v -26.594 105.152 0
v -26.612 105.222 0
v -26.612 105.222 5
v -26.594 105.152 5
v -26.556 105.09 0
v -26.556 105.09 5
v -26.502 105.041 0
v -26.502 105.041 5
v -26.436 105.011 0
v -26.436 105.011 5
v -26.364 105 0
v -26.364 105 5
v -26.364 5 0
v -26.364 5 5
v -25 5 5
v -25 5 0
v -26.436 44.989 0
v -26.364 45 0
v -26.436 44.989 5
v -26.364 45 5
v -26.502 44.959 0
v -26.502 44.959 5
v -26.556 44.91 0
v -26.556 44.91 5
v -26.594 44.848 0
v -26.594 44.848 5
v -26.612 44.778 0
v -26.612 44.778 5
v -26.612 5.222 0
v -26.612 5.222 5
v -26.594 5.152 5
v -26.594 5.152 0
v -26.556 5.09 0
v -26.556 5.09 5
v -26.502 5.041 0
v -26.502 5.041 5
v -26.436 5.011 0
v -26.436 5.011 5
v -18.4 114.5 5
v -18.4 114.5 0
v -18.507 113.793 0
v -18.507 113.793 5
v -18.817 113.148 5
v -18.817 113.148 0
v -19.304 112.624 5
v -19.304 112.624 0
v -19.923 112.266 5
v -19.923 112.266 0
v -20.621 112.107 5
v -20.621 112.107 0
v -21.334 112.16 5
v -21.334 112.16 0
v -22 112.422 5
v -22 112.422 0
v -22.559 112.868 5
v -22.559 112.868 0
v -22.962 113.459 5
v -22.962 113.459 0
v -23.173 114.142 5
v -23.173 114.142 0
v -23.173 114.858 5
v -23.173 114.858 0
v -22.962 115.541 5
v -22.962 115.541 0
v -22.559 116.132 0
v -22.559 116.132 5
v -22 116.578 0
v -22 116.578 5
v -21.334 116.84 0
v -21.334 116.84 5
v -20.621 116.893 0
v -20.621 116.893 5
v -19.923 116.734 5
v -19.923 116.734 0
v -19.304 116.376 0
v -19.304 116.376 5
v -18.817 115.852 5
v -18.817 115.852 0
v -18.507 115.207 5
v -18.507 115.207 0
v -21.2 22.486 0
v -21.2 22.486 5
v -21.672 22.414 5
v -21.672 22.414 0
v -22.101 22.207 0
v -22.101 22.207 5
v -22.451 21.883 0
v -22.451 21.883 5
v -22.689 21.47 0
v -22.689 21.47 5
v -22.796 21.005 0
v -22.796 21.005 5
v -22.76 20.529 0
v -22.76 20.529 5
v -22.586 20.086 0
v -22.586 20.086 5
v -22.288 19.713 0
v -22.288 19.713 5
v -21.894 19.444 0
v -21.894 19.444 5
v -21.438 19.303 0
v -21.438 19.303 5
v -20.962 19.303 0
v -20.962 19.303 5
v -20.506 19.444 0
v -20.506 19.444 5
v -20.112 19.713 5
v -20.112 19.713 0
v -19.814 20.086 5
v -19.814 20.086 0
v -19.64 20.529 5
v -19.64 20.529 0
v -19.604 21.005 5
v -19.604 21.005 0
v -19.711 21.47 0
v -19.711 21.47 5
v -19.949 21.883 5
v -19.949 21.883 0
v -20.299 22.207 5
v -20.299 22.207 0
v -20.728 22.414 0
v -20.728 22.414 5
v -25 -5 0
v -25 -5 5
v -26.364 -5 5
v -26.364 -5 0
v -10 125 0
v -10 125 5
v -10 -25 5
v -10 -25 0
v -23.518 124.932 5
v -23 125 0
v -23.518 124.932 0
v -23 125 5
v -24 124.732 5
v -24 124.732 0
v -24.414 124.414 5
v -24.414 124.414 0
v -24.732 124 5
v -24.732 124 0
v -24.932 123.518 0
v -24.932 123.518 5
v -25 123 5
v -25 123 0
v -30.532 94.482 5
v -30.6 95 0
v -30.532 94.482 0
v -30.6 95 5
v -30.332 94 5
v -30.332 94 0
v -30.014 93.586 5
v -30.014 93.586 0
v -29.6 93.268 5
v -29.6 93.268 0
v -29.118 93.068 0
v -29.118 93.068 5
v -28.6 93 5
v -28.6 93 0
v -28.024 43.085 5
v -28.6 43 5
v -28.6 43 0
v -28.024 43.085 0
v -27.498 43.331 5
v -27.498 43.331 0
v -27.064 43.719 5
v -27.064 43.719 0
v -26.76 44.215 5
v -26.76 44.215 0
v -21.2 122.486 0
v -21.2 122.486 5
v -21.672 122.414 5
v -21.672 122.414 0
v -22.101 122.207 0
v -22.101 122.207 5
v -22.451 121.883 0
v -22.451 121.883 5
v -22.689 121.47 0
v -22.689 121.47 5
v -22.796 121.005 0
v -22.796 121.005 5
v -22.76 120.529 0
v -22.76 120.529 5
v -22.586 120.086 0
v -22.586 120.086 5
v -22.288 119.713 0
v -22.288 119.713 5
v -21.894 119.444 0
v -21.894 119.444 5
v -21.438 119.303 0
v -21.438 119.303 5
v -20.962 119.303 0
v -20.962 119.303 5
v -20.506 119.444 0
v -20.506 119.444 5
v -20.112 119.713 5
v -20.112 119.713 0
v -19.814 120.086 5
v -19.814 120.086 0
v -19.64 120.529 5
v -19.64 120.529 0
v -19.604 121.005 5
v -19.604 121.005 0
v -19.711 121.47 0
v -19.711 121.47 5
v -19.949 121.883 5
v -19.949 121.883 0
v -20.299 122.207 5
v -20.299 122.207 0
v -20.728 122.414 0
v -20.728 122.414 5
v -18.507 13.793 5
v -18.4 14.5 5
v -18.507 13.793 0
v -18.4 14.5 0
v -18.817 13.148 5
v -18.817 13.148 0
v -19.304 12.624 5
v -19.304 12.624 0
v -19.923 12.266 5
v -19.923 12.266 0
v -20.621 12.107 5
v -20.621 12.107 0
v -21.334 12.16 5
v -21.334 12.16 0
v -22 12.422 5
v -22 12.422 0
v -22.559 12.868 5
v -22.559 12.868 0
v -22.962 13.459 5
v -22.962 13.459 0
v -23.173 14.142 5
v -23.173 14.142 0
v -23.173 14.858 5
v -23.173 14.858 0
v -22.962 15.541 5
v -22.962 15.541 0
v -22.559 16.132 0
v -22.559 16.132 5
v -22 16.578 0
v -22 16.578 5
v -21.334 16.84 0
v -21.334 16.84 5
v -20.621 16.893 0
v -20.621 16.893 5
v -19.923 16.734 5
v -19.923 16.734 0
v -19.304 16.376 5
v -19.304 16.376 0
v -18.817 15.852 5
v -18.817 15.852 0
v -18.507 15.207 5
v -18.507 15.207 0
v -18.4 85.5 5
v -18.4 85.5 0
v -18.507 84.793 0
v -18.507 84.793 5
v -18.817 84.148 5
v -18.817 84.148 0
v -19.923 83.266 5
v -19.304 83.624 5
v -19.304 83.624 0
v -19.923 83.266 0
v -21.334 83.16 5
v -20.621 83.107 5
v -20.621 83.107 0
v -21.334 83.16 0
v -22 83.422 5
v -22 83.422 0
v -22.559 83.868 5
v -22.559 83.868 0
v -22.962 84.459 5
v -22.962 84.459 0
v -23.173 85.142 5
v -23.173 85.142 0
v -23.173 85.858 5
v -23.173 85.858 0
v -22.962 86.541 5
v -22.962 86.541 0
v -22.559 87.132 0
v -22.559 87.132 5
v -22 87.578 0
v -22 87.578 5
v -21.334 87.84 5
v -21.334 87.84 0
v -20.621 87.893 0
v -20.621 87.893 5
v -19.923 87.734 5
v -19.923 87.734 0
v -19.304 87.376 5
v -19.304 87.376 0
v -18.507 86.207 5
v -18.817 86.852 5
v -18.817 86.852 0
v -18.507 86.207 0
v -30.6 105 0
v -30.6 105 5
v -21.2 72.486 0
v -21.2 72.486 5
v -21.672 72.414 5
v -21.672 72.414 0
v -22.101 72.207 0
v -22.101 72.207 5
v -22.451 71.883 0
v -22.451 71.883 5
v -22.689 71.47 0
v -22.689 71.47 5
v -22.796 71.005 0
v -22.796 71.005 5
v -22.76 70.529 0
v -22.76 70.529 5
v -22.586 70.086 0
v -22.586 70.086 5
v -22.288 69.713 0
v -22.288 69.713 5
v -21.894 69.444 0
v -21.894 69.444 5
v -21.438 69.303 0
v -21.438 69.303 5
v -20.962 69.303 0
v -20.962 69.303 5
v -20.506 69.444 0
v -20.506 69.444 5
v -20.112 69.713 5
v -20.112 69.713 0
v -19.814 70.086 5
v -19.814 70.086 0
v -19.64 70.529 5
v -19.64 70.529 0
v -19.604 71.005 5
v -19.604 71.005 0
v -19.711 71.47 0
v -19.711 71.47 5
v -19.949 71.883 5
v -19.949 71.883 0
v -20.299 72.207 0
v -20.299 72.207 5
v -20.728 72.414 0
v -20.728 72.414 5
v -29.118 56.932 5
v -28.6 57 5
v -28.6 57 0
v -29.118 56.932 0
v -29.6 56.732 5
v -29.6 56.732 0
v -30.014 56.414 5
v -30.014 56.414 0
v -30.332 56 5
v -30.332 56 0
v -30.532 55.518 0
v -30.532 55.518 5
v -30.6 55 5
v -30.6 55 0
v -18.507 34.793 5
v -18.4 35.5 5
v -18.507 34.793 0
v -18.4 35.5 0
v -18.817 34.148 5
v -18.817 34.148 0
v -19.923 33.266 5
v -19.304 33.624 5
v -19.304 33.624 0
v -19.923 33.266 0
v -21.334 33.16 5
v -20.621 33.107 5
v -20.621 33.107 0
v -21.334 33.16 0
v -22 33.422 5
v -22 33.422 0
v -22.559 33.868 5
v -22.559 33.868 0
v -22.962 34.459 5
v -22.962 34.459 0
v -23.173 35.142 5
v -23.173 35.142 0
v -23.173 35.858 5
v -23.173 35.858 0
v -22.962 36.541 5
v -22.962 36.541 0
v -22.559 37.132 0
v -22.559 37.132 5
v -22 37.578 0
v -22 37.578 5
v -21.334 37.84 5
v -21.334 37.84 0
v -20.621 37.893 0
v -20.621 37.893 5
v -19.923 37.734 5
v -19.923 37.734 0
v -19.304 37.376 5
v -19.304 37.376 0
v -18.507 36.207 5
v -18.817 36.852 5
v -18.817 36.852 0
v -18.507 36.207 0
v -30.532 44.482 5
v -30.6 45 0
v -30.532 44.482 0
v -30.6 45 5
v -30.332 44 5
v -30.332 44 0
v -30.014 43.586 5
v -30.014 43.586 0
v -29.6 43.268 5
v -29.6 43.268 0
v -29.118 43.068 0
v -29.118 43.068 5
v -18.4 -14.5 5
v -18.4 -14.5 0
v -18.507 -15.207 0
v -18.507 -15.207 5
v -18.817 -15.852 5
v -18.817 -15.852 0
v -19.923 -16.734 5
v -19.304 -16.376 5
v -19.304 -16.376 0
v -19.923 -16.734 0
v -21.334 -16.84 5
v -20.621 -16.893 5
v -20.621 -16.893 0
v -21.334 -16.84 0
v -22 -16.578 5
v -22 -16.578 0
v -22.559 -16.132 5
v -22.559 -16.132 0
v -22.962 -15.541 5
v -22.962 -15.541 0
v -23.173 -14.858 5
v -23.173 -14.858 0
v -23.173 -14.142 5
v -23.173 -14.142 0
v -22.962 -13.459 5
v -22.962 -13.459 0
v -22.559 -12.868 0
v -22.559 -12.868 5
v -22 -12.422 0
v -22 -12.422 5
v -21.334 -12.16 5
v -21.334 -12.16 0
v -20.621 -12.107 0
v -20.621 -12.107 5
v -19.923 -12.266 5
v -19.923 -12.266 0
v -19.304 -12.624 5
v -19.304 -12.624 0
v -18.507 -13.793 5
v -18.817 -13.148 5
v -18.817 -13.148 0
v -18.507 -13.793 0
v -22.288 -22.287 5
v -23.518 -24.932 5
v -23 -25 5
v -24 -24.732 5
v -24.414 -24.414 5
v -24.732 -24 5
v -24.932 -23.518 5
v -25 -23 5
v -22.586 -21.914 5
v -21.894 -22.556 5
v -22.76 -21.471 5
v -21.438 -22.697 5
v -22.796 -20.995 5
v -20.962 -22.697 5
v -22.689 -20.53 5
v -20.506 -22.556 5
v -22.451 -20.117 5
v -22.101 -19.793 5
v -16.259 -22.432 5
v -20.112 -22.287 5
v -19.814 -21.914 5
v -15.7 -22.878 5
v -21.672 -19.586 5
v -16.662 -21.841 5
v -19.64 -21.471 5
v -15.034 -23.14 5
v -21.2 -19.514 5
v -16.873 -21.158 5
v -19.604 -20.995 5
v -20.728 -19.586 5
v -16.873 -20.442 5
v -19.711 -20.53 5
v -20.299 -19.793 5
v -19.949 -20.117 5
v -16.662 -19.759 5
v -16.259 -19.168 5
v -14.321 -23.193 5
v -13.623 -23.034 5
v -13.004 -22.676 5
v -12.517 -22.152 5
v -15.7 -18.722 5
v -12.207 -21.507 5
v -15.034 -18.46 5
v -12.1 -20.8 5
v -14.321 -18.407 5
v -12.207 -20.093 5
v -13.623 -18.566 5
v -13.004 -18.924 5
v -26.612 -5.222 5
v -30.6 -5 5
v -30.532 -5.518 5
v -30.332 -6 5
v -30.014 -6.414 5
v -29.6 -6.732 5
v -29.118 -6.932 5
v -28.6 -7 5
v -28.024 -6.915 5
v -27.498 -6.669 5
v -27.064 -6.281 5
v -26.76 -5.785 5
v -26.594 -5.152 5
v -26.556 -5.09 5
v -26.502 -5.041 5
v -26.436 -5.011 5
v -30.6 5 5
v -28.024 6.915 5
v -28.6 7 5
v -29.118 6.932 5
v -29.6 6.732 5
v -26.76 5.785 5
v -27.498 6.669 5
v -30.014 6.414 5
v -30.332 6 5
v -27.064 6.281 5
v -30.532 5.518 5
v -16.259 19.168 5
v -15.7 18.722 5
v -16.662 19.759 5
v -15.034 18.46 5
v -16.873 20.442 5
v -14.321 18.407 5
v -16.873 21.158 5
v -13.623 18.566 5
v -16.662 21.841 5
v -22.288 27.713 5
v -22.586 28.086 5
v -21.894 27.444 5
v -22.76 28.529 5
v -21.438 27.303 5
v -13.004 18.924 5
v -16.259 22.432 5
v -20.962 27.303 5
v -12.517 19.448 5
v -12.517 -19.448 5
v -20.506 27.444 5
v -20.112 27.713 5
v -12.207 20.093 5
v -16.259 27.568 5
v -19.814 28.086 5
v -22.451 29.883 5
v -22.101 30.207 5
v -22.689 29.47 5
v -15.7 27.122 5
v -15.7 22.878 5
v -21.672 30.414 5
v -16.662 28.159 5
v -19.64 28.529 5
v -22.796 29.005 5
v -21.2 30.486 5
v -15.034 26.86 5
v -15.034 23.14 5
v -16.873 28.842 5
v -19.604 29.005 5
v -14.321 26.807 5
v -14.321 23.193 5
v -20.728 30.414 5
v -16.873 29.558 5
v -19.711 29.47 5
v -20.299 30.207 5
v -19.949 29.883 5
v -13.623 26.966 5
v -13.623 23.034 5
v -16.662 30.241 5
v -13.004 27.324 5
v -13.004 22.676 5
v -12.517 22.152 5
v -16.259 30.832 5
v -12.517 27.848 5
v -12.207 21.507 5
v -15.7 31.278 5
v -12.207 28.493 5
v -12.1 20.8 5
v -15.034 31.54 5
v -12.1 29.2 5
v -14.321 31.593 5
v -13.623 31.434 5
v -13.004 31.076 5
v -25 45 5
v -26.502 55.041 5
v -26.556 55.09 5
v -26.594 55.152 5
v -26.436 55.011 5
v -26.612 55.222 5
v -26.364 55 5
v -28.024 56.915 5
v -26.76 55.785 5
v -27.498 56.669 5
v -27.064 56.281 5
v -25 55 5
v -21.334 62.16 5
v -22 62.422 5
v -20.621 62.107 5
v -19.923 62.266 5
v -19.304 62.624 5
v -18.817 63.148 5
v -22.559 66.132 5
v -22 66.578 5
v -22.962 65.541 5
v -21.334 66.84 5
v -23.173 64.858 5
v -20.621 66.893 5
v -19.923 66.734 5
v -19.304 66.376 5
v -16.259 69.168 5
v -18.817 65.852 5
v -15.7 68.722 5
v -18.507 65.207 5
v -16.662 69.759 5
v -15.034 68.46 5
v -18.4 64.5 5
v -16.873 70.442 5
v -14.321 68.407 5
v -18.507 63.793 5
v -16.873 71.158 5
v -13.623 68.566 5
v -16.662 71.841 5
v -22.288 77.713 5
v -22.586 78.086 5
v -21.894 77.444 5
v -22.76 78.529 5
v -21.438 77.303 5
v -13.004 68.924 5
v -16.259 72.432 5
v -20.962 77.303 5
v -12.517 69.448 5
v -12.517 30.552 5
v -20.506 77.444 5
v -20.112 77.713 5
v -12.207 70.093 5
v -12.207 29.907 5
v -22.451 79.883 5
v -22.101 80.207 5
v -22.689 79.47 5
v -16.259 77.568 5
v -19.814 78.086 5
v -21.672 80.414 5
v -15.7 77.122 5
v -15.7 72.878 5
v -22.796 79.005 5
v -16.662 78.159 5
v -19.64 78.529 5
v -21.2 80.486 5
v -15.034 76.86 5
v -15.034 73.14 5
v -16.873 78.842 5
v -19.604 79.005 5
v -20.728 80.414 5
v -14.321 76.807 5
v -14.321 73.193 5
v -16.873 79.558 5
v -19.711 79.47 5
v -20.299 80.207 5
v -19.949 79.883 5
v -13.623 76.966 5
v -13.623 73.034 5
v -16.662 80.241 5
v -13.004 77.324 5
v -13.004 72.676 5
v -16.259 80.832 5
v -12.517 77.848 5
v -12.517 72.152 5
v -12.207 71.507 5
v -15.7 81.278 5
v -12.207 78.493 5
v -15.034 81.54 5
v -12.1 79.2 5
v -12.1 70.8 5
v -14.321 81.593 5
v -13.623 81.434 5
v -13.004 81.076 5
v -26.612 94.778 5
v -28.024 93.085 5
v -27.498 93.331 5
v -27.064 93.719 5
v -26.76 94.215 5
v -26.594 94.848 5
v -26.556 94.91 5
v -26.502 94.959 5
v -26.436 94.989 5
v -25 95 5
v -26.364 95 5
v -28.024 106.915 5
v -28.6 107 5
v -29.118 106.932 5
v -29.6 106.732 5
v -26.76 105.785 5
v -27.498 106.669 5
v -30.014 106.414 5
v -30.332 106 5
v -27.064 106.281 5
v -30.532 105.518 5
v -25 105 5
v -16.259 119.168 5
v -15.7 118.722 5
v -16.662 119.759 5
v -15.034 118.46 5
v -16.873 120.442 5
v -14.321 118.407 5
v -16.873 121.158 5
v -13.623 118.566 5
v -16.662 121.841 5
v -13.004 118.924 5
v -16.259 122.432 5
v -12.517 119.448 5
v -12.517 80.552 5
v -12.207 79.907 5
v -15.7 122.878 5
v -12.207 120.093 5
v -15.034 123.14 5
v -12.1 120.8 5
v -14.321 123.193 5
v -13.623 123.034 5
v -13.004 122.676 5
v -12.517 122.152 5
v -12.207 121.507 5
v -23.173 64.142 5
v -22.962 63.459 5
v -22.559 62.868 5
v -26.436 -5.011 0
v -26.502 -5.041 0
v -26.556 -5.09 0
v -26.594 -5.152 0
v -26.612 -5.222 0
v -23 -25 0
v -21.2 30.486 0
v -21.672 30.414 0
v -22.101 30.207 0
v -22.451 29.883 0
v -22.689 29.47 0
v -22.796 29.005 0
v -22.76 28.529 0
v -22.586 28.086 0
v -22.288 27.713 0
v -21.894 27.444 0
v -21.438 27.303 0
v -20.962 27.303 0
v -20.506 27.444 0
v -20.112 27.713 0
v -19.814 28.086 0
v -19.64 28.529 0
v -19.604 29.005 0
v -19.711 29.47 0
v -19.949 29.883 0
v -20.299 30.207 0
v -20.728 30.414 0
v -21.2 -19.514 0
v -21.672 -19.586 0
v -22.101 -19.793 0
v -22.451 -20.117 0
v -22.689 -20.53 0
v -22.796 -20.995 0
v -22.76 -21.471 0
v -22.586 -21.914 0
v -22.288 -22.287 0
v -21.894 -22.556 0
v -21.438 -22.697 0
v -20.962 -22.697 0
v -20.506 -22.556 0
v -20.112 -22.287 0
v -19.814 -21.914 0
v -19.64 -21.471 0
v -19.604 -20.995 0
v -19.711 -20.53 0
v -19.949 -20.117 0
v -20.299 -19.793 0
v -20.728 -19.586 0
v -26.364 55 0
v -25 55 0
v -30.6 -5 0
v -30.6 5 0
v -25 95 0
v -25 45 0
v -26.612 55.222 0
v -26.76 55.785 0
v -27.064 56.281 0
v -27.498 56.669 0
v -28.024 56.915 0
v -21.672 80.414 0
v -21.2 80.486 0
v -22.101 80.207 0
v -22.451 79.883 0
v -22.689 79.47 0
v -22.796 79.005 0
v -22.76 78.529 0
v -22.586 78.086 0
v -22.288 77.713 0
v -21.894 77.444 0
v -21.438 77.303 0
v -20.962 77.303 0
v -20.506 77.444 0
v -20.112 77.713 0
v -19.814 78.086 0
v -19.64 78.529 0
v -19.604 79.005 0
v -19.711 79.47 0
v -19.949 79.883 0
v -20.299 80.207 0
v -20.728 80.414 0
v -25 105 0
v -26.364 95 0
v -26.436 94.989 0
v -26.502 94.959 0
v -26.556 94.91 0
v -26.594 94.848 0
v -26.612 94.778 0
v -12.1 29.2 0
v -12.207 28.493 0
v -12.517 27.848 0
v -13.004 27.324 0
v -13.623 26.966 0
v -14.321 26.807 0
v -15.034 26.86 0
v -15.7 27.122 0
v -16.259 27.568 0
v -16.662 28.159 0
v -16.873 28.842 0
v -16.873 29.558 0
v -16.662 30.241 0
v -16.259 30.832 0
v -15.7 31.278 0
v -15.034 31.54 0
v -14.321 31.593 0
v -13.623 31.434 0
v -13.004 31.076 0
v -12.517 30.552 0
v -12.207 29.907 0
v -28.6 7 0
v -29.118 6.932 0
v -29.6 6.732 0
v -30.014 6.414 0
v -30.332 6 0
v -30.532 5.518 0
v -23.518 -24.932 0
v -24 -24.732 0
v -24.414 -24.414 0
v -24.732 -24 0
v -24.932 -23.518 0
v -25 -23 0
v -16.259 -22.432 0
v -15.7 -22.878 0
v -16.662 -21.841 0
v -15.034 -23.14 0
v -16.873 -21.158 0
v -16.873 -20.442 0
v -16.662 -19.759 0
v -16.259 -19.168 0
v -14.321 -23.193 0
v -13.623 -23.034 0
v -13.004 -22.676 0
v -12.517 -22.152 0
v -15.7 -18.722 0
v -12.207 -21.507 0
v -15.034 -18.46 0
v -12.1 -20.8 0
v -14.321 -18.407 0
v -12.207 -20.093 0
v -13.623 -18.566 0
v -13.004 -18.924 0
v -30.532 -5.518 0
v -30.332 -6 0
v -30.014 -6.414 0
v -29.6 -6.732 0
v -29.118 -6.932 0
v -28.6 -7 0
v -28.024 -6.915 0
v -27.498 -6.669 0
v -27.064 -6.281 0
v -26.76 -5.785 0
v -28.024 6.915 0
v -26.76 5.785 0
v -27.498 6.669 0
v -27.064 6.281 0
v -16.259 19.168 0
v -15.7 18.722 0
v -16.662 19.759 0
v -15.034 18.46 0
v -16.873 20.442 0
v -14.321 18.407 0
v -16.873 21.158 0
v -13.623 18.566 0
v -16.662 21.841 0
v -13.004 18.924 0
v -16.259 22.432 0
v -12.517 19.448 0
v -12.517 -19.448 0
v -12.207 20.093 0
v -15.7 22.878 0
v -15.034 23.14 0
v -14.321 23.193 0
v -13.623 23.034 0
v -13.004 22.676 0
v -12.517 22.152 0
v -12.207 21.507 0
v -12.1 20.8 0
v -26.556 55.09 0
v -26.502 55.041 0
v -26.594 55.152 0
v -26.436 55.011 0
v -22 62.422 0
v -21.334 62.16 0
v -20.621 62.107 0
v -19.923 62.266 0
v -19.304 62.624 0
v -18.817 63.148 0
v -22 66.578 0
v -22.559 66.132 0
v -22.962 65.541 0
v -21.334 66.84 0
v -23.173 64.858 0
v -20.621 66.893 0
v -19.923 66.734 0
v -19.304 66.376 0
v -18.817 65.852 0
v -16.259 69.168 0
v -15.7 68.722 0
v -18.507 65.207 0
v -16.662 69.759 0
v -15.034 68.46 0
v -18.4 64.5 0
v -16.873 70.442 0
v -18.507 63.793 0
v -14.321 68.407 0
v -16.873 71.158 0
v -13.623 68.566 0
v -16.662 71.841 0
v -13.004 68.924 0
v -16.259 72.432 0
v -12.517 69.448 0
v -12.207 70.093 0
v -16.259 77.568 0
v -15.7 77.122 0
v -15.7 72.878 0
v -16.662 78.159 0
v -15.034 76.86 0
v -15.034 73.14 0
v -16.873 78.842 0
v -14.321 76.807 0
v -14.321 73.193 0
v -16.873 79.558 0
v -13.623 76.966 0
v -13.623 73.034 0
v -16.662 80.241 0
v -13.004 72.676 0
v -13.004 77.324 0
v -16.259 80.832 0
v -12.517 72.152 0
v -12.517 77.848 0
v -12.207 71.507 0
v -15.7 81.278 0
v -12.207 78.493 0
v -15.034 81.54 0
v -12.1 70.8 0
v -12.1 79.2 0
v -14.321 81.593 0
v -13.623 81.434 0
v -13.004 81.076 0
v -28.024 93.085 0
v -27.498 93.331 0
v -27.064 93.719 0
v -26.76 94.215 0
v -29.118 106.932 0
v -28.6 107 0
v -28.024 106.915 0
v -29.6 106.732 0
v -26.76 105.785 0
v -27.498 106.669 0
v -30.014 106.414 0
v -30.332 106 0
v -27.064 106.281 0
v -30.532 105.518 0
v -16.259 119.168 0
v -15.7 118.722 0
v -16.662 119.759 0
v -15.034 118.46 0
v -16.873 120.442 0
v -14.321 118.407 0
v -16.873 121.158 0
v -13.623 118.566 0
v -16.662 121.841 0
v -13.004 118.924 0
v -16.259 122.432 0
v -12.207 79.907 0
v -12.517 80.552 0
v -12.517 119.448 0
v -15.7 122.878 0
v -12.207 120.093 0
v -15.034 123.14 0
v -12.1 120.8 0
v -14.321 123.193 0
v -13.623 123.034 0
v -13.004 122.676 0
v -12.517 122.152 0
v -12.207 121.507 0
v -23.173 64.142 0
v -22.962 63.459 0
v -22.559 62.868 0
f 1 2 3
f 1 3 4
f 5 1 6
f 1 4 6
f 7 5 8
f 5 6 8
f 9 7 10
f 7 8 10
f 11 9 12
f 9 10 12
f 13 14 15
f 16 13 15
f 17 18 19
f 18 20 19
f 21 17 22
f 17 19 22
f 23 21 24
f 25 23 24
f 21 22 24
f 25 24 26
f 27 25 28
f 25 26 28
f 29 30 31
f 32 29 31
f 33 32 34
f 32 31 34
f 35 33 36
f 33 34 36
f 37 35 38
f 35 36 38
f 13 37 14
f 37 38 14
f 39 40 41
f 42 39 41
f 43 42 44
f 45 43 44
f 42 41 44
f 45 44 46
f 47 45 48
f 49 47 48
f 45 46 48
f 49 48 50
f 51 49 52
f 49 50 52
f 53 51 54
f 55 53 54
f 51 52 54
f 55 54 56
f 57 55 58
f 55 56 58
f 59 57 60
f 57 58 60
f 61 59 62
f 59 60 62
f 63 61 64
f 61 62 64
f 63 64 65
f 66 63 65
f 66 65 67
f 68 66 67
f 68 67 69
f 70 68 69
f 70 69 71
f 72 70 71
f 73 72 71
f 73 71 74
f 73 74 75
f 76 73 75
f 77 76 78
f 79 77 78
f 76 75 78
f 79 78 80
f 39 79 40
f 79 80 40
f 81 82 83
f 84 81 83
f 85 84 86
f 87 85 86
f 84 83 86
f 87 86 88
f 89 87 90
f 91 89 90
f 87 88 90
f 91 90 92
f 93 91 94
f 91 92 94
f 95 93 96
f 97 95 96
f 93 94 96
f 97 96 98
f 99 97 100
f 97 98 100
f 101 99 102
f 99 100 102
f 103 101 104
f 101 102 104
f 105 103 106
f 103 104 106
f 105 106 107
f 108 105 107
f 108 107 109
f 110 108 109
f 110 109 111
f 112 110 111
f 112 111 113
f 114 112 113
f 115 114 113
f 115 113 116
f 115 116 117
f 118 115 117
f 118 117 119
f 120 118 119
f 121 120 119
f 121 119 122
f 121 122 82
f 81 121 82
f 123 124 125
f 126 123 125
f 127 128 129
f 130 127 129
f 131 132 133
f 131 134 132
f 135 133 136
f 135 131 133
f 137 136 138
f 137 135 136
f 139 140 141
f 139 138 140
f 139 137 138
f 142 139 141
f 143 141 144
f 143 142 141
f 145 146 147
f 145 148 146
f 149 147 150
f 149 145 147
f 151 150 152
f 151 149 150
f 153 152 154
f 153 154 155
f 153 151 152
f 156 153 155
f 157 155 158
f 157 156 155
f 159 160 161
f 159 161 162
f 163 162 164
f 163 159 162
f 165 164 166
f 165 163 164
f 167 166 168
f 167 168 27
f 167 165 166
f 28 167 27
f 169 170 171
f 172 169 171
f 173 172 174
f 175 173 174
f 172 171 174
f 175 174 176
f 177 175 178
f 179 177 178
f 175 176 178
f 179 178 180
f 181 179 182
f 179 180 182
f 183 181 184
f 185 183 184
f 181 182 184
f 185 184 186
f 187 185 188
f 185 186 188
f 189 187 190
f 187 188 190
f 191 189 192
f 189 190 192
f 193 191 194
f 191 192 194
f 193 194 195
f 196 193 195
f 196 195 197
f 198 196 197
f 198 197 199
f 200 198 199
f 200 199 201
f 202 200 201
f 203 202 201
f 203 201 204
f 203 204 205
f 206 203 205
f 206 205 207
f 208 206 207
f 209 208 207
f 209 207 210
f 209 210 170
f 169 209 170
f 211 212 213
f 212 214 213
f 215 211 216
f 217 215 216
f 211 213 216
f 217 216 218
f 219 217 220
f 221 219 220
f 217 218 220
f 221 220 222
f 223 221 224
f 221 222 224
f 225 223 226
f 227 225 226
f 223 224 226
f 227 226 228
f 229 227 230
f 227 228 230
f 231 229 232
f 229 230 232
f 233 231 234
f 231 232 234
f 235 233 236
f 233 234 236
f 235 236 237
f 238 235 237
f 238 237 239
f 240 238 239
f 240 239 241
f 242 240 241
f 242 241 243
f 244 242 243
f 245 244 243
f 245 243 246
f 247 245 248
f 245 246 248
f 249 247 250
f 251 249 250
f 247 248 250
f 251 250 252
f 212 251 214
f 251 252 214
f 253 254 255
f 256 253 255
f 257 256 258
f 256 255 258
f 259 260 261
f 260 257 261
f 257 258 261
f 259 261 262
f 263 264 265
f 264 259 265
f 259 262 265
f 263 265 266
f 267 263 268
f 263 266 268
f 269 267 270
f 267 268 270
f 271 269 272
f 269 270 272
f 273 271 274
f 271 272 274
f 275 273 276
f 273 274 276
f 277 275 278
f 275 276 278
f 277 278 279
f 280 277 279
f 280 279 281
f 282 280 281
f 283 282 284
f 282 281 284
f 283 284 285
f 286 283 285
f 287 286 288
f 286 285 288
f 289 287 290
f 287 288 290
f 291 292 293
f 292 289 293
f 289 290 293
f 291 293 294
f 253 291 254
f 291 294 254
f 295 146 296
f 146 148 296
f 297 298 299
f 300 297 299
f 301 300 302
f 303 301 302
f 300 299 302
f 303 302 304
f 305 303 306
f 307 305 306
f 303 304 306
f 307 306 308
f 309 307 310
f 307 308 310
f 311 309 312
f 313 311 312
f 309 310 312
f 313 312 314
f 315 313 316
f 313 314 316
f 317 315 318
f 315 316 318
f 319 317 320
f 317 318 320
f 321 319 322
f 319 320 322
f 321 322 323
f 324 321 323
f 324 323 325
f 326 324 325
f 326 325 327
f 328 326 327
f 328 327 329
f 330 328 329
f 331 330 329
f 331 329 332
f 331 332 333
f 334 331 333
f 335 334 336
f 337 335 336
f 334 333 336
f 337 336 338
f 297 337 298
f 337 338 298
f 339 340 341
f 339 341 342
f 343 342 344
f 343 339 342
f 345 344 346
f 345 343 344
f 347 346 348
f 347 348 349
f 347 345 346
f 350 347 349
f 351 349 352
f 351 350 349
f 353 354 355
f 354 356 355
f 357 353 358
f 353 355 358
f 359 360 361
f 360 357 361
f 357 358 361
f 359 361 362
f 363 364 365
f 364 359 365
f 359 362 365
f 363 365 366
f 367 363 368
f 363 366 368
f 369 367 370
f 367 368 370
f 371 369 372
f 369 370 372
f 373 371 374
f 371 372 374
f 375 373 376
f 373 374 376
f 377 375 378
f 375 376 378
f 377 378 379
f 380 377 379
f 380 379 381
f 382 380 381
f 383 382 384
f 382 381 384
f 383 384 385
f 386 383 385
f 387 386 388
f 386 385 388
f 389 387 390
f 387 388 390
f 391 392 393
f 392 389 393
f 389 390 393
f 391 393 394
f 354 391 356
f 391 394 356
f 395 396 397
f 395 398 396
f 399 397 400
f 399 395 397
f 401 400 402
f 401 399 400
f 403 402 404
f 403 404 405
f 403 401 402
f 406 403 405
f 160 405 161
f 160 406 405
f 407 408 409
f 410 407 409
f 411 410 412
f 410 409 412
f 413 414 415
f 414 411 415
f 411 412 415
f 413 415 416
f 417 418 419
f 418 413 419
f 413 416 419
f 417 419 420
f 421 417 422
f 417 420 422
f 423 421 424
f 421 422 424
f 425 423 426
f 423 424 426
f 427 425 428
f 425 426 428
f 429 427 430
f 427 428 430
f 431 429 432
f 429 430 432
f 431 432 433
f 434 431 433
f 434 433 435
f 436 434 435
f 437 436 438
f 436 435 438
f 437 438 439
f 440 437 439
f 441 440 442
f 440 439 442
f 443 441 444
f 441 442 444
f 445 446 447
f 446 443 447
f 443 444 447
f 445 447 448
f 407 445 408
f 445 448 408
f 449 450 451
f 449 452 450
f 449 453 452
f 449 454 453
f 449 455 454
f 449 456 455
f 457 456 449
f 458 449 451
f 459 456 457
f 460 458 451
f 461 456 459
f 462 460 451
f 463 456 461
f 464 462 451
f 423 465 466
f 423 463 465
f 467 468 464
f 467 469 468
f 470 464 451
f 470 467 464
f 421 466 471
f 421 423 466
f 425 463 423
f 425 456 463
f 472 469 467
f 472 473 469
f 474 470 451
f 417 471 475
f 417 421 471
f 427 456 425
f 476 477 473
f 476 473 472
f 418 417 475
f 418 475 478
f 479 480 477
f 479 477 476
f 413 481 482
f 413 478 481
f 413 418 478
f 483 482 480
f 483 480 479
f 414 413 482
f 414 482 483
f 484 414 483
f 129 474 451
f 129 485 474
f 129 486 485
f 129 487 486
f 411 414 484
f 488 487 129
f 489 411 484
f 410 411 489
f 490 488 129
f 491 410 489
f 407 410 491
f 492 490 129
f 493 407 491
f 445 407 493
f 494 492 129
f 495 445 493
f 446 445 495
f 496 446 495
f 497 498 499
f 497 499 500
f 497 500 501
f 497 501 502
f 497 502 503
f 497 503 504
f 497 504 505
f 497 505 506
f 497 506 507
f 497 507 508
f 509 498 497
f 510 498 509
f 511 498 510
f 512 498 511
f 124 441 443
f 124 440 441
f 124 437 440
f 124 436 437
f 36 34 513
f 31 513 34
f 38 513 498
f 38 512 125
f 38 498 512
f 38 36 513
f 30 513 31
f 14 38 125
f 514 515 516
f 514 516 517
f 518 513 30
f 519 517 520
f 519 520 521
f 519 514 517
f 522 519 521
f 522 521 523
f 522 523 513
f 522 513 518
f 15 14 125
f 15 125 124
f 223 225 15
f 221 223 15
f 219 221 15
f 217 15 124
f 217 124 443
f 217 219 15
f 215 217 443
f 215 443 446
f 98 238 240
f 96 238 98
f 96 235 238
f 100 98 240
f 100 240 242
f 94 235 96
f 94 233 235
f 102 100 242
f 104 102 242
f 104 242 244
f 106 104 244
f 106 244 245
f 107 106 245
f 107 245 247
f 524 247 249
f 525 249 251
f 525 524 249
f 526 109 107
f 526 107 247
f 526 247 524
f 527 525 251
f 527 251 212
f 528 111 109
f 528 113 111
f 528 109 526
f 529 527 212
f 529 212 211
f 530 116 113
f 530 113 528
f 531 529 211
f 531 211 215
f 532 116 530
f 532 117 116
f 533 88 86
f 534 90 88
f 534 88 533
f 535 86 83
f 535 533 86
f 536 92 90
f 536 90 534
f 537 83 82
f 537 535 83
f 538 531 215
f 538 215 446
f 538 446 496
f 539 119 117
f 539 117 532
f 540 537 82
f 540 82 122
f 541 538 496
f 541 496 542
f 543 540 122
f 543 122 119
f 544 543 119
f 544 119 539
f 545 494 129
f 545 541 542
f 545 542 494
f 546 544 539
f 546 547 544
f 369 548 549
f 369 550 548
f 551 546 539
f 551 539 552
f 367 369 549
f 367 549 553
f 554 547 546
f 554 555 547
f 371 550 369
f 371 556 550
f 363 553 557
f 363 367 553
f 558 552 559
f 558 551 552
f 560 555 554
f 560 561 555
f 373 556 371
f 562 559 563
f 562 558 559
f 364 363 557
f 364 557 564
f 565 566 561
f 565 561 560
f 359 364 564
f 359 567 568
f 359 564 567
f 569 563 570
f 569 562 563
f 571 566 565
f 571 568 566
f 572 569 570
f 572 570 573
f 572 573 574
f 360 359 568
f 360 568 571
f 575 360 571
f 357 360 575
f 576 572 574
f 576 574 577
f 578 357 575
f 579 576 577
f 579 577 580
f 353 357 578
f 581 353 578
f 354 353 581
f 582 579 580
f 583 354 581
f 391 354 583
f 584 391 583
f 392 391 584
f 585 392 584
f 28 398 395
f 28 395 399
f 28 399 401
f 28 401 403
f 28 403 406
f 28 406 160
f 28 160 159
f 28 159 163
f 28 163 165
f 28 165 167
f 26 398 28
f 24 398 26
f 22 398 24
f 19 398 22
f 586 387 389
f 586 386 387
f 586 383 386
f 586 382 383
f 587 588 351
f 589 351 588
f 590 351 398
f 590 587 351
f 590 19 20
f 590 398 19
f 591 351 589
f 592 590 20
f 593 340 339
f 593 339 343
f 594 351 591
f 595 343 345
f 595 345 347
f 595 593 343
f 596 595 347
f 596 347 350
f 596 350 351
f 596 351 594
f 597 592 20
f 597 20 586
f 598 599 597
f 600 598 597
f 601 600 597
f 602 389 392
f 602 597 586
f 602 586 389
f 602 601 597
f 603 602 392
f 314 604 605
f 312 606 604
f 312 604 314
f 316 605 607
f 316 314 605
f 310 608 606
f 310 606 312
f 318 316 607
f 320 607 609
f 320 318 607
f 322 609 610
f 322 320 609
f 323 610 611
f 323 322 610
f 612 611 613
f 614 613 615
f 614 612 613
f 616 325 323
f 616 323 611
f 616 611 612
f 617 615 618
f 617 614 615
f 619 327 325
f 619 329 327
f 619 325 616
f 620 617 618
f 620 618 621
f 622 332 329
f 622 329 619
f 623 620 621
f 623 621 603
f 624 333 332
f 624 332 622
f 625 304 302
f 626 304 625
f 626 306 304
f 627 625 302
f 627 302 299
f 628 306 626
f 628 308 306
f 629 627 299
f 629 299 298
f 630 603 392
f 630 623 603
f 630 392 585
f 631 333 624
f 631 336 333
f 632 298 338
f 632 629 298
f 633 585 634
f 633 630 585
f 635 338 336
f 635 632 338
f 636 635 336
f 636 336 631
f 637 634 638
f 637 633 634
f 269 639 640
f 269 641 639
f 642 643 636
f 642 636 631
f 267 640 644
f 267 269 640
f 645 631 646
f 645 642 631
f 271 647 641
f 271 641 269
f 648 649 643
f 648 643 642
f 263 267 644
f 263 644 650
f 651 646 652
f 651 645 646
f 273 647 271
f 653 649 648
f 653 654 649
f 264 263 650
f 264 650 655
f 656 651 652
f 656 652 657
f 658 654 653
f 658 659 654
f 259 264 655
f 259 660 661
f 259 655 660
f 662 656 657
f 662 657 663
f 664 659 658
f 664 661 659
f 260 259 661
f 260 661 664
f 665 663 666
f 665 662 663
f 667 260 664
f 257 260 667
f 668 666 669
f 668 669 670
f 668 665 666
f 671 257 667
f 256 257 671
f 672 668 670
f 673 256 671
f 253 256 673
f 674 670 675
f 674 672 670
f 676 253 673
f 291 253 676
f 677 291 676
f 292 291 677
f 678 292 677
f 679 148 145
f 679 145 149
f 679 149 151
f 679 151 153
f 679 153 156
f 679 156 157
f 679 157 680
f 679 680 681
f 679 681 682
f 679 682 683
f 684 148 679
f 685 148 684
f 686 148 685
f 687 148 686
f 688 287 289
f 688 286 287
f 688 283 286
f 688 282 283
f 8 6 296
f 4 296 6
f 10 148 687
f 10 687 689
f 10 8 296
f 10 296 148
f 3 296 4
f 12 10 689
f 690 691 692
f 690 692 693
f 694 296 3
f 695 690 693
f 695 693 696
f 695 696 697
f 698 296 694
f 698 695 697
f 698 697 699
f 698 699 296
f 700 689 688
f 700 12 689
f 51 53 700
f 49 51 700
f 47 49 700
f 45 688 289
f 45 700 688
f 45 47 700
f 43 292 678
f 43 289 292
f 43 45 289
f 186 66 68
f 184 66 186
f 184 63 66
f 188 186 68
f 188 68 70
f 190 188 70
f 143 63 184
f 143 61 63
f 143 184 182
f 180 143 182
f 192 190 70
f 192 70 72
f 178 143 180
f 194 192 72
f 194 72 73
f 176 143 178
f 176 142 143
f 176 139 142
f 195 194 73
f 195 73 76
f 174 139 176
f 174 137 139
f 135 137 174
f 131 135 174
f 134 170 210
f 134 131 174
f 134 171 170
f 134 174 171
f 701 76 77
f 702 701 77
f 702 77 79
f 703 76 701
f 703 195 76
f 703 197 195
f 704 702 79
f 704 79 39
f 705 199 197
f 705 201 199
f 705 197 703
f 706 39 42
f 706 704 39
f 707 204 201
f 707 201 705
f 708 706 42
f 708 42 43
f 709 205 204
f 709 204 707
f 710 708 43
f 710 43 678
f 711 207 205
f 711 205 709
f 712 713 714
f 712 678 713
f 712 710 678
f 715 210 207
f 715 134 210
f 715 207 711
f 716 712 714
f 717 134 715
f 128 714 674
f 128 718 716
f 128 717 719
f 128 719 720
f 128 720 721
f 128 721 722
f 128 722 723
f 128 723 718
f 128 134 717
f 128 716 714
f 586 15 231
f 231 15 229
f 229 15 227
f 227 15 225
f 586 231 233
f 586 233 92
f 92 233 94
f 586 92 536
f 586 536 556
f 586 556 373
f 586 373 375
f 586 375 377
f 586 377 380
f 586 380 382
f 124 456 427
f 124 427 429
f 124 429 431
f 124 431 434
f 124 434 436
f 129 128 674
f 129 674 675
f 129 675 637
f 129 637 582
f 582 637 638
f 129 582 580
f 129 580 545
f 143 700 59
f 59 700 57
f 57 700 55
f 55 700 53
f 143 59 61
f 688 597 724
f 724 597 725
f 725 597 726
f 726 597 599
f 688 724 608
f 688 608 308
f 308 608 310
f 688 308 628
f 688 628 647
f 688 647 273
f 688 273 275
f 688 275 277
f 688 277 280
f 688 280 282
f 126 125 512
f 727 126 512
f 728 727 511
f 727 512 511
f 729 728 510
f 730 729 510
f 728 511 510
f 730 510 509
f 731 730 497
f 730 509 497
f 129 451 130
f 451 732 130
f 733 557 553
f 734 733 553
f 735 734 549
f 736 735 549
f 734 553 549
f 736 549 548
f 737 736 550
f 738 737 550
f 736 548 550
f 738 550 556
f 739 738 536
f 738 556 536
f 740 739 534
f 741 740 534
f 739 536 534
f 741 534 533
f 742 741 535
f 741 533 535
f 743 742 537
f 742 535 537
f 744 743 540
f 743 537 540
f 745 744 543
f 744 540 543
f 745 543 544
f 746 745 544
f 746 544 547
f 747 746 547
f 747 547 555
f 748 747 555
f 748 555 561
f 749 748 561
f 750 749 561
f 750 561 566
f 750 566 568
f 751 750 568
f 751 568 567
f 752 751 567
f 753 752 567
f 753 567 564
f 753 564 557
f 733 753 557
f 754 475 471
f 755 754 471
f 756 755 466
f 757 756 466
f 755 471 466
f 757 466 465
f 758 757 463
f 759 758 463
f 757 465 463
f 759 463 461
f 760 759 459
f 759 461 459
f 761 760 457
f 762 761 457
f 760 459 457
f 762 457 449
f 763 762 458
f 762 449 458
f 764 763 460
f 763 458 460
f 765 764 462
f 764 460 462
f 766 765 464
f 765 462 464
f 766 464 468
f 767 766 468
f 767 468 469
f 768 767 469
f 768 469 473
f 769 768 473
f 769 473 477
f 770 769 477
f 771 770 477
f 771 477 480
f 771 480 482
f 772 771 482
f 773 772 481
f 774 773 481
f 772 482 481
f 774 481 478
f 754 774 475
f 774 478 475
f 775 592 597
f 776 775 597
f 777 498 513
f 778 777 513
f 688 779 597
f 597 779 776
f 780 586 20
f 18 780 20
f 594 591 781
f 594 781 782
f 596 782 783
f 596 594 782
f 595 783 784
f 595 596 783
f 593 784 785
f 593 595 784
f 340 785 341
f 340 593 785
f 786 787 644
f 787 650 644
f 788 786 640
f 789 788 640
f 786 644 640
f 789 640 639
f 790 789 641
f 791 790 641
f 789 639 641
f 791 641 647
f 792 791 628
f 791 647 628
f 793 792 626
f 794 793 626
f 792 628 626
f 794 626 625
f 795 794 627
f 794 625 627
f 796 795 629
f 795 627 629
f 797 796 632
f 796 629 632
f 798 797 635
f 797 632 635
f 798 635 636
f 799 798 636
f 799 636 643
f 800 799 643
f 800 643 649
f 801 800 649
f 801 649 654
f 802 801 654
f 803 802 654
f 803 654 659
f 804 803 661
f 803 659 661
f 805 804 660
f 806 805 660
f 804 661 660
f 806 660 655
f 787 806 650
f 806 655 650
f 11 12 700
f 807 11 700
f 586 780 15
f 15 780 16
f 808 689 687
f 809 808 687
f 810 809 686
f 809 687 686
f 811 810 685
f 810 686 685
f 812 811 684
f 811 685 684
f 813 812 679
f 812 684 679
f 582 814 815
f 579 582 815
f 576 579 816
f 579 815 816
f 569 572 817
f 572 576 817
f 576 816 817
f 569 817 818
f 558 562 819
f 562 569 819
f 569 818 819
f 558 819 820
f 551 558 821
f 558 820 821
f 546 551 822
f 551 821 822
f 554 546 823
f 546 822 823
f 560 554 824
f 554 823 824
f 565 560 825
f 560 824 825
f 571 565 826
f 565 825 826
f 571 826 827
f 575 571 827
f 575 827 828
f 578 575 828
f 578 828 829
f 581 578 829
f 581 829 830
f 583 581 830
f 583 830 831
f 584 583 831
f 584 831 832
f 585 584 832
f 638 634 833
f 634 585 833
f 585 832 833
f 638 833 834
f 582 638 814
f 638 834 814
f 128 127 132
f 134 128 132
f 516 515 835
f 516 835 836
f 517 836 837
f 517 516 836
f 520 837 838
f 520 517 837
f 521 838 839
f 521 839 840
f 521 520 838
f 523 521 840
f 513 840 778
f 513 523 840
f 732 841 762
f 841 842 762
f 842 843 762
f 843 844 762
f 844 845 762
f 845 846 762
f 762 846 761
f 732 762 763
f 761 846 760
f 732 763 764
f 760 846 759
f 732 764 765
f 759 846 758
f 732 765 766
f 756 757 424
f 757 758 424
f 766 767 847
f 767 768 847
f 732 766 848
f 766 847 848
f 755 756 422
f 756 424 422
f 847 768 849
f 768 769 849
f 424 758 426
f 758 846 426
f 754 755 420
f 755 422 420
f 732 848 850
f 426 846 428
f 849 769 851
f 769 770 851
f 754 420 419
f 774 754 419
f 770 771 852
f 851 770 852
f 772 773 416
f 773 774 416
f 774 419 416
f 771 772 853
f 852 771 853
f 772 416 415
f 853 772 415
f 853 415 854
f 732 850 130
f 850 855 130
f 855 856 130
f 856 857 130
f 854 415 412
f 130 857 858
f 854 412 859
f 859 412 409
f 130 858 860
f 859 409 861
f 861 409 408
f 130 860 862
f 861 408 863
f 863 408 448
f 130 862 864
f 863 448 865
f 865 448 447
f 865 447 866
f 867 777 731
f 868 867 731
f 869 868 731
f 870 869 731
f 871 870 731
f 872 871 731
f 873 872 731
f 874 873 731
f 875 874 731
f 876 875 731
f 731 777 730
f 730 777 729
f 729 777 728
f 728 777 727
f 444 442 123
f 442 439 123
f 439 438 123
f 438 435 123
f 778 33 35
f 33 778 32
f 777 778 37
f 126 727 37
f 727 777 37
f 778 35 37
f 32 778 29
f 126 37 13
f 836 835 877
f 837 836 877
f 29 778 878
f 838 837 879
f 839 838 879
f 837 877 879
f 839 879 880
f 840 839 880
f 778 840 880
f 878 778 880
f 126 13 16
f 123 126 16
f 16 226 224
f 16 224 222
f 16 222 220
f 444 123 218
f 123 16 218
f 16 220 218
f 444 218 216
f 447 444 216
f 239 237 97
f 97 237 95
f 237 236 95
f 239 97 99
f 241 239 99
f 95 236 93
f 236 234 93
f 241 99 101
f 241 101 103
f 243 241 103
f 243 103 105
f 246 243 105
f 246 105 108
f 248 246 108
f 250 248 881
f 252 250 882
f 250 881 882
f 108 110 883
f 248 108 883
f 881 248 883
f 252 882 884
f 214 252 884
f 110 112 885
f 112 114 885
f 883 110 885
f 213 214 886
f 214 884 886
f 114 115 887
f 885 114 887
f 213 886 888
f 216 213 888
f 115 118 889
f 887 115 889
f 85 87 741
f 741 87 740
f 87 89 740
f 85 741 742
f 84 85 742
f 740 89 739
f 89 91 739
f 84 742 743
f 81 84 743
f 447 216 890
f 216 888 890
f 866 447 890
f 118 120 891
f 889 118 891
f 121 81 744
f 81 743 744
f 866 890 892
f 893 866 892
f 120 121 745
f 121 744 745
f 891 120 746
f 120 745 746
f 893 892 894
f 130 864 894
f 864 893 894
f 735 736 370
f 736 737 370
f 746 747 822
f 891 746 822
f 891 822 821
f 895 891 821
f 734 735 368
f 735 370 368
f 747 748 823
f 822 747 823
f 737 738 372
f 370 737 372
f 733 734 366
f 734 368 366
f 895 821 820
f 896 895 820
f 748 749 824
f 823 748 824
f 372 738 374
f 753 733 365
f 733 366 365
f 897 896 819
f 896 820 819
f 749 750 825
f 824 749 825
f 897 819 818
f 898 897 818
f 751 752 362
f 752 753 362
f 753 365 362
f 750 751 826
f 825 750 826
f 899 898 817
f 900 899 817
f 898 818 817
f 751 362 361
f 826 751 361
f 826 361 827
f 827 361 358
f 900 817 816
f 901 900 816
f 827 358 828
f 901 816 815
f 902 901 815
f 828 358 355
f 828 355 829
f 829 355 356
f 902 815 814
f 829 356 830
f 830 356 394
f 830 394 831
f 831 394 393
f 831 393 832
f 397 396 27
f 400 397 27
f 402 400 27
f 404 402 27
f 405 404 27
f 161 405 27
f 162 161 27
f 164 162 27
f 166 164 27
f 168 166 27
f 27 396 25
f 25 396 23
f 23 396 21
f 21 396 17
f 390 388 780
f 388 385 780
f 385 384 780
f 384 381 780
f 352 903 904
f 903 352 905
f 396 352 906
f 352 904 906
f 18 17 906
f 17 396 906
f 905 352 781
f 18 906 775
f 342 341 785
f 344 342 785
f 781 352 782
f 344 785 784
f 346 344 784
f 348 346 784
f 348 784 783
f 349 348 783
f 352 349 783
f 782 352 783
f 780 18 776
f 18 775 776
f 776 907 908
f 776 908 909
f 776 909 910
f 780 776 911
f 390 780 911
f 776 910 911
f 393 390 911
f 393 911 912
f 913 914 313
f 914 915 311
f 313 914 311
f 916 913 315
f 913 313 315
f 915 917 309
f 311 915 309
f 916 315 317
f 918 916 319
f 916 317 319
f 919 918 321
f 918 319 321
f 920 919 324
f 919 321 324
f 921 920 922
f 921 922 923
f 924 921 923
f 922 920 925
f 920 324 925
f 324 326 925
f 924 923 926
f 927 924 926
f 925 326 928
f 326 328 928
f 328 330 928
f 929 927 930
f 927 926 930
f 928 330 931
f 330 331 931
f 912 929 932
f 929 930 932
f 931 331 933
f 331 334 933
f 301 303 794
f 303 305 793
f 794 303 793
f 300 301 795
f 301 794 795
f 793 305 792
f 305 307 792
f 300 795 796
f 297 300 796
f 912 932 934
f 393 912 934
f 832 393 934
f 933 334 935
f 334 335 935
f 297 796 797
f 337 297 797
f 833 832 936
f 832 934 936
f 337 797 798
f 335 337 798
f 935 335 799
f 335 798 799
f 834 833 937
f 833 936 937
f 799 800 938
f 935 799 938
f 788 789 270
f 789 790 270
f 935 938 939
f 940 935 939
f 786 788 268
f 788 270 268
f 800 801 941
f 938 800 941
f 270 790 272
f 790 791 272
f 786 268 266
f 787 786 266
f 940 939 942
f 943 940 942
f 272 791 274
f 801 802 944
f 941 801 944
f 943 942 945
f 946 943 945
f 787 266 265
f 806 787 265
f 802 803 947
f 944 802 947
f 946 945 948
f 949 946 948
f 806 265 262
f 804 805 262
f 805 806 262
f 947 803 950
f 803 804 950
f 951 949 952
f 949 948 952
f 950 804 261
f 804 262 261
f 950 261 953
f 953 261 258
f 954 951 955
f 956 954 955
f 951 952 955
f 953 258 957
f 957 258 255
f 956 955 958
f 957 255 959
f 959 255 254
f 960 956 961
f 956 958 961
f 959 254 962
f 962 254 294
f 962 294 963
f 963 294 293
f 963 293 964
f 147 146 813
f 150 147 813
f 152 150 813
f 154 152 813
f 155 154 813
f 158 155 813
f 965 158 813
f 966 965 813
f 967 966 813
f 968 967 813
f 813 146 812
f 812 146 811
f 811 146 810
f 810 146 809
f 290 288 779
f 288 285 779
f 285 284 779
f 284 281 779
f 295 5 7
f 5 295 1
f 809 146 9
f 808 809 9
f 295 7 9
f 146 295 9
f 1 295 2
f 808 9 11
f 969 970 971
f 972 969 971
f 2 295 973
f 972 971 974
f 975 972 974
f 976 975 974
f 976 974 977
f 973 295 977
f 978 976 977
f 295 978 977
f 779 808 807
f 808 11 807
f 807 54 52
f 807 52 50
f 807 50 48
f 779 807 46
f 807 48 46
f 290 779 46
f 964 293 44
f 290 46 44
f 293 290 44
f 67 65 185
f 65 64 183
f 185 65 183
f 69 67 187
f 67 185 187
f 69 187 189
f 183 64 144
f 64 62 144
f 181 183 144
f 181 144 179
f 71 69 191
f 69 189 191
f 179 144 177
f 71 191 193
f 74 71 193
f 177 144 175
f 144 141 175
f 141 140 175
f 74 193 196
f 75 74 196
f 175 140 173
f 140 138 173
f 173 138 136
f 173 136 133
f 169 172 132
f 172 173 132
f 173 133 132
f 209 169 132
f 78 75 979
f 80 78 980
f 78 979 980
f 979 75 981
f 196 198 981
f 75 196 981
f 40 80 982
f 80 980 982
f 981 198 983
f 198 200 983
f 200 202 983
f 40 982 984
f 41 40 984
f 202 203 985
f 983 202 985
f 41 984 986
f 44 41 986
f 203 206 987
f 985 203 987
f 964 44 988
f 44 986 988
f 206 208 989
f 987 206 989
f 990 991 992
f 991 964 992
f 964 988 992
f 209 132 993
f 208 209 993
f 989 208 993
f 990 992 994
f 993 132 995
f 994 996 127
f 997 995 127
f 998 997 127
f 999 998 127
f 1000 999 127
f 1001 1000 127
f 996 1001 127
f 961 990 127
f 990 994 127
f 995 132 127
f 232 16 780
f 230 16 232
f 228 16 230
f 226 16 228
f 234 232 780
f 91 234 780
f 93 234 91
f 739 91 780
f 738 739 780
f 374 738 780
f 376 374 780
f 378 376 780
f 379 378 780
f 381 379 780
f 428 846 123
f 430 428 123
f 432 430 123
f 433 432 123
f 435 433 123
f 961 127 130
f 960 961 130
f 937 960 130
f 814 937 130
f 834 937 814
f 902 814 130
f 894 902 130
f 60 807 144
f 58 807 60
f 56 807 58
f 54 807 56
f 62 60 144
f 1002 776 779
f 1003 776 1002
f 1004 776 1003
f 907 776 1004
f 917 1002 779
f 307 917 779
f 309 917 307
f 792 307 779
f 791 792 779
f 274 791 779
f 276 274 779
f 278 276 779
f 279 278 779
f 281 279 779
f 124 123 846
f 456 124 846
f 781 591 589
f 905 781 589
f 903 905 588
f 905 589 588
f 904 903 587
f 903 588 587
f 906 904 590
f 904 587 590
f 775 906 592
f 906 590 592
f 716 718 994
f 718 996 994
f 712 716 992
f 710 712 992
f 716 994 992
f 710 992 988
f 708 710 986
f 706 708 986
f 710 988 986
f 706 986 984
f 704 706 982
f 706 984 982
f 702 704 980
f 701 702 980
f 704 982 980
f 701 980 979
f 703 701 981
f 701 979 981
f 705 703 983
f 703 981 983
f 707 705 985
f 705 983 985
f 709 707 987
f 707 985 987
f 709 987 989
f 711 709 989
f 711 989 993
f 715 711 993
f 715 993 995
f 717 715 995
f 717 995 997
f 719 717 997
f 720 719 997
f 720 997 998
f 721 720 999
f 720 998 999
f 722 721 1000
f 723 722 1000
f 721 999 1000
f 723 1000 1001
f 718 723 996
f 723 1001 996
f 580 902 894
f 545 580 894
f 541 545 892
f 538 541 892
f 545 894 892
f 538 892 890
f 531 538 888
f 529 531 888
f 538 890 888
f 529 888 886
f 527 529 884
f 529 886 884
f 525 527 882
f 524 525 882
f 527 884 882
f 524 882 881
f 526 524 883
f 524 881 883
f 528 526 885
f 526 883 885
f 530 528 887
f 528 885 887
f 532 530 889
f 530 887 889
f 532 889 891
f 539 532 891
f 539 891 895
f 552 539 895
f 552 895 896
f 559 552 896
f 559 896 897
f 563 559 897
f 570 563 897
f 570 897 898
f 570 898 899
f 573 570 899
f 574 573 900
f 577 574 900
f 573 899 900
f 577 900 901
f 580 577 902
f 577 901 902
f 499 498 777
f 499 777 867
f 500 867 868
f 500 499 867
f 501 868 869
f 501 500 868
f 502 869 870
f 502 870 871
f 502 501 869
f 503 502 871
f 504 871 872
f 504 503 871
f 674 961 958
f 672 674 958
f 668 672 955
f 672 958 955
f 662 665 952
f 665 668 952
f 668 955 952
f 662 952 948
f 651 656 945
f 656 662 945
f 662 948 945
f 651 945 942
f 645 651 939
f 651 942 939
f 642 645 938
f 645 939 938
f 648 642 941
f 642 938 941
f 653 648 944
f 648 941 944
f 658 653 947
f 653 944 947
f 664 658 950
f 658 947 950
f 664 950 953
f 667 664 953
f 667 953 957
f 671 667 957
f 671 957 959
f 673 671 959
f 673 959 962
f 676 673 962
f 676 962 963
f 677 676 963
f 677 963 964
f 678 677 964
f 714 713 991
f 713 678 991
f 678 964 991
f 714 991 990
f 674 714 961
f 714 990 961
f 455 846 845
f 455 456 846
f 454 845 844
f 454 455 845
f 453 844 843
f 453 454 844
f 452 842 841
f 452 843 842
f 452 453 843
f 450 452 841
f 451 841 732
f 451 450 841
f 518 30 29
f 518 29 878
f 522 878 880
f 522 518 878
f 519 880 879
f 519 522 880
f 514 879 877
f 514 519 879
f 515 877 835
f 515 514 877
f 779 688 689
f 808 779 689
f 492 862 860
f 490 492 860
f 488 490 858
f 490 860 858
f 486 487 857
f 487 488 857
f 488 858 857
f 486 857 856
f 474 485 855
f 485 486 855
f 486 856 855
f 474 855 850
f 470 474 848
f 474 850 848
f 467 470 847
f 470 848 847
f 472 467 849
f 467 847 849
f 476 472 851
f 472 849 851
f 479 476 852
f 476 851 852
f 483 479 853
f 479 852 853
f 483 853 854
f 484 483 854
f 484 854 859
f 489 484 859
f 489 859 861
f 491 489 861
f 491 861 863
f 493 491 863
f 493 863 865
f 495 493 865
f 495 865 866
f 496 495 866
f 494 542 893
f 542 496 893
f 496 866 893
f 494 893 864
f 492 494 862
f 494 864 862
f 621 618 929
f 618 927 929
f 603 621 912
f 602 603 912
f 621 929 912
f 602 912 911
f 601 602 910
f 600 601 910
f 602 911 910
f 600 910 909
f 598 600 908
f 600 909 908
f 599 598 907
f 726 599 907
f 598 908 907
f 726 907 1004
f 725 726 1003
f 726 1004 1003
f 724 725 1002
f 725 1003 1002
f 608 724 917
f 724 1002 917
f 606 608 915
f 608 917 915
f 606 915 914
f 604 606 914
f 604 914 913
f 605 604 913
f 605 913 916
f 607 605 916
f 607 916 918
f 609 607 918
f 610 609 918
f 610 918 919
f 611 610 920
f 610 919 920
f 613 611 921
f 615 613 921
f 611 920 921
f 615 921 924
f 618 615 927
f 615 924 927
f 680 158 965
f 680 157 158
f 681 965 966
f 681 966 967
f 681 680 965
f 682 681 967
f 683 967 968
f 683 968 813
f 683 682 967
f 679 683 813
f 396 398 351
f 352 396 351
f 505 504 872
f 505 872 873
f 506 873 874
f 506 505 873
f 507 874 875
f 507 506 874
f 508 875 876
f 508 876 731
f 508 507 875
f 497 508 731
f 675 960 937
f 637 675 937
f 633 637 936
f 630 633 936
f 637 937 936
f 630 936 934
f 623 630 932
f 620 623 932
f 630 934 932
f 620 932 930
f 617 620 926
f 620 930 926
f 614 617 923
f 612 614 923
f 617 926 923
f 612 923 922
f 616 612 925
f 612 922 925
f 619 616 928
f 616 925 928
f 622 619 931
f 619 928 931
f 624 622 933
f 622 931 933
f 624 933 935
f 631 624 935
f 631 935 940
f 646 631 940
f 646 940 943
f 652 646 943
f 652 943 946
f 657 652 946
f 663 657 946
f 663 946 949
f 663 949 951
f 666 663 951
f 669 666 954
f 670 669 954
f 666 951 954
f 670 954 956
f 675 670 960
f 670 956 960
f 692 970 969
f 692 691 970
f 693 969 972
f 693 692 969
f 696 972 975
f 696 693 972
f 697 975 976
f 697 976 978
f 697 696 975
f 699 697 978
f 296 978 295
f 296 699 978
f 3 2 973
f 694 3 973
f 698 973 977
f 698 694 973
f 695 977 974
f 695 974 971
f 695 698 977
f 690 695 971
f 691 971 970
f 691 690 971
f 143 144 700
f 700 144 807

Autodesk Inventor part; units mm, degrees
ref_plane "YZ Plane" through (0, 0, 0) normal (1, 0, 0) x (0, 1, 0)
ref_plane "XZ Plane" through (0, 0, 0) normal (0, 1, 0) x (-1, 0, 0)
ref_plane "XY Plane" through (0, 0, 0) normal (0, 0, 1) x (1, 0, 0)
sketch "Skizze1" plane through (0, 0, 0) normal (0, 0, 1) x (1, 0, 0)
  line L0 (-17, 0) -> (-25, 0)
  line L1 (-25, 0) -> (-25, -23)
  line L2 (-23, -25) -> (0, -25)
  line L3 (0, -25) -> (0, -17)
  line L4 (-17, 0) -> (-17, -15)
  line L5 (-15, -17) -> (0, -17)
  arc A0 (-25, -23) -> (-23, -25) centre (-23, -23) ccw construction
  circle A1 centre (-20.8, -14.5) radius 2.4
  circle A2 centre (-14.5, -20.8) radius 2.4
  arc A3 (-17, -15) -> (-15, -17) centre (-15, -15) ccw
  circle A4 centre (-14.5, -20.8) radius 2.4 construction
  circle A5 centre (-20.8, -14.5) radius 2.4 construction
  line L6 (-30.4971, 0) -> (5.0828, 0) construction
  line L7 (0, -30.4971) -> (0, 5.0828) construction
  line L8 (-23, -25) -> (-25, -25)
  line L9 (-25, -23) -> (-25, -25)
  line L10 (0, -17) -> (0, 0)
  line L11 (0, 0) -> (-17, 0)
  point P0 (-17, -17)
  dimension "d278" = 25
  dimension "d279" = 25
  dimension "d2" = 8
  dimension "d281" = 8
  dimension "d282" = 2
  dimension "d286" = 4.8
  dimension "d_hole" = 4.8
  dimension "d290" = 20.8
  dimension "d" = 20.8
  dimension "d292" = 2
  dimension "d313" = 6.3
  dimension "d314" = 6.3
  dimension "d332" = 0
extrude "Extrusion1" add sketch "Skizze1" along normal blind 5
mirror "Mirror6" about plane through (0, 0, 0) normal (0, 1, 0) of "Extrusion1"
sketch "Sketch26" plane through (0, 0, 5) normal (0, 0, 1) x (1, 0, 0)
  line L0 (-25, 25) -> (0, 25) projected
  line L1 (-25, -25) -> (-25, 25) projected
  line L2 (-25, -25) -> (0, -25) projected
  line L3 (-25, -23) -> (-25, 23) projected
  line L4 (-28.6, -7) -> (-28.6, -7)
  line L5 (-30.6, -5) -> (-30.6, 5)
  line L6 (-28.6, 7) -> (-28.6, 7)
  line L7 (-25, 16.8311) -> (-25, -7)
  line L8 (-26.3639, 5) -> (-25, 5)
  line L9 (-25, -5) -> (-26.3639, -5)
  arc A0 (-30.6, -5) -> (-28.6, -7) centre (-28.6, -5) ccw
  arc A1 (-28.6, -7) -> (-26.6124, -5.2222) centre (-28.6, -5) ccw
  arc A2 (-28.6, 7) -> (-30.6, 5) centre (-28.6, 5) ccw
  arc A3 (-26.6124, 5.2222) -> (-28.6, 7) centre (-28.6, 5) ccw
  arc A4 (-26.3639, -5) -> (-26.6124, -5.2222) centre (-26.3639, -5.25) ccw
  arc A5 (-26.6124, 5.2222) -> (-26.3639, 5) centre (-26.3639, 5.25) ccw
  line L10 (-37.2171, 0) -> (6.2028, 0) projected
  line L11 (0, -25) -> (0, 25) projected
  point P0 (0, 0)
  point P1 (-24.0313, 1.861)
  point P2 (-28.6, -7)
  point P3 (-25, -5)
  point P4 (-25, 5)
  point P5 (-28.6, 7)
  dimension "d293" = 5.6
  dimension "d300" = 2
  dimension "d301" = 0.25
  dimension "d365" = 7
  dimension "d367" = 7
  dimension "d385" = 5
  dimension "d386" = 5
extrude "Extrusion13" add sketch "Sketch26" against normal up to surface (5 mm away) contours L10 L5 A2 A3 A5 L8 L1 | L1 L9 A4 A1 A0 L5 L10
sketch "Skizze36" plane through (0, 0, 5) normal (0, 0, 1) x (1, 0, 0)
  line L0 (30.9789, 27.5712) -> (-10, 27.5712)
  line L1 (-10, 27.5712) -> (-10, -32.2955)
  line L2 (-10, -32.2955) -> (30.9789, -32.2955)
  line L3 (30.9789, -32.2955) -> (30.9789, 27.5712)
  line L4 (-25, 23) -> (-25, 5) projected
  point P0 (0, 0)
  dimension "d401" = 15
extrude "Extrusion19" cut sketch "Skizze36" against normal blind 10
pattern_linear "Rechteckige Anordnung8" count 3 spacing 50 along (0, 1, 0) of "Extrusion1", "Mirror6", "Extrusion13", "Extrusion19"
fillet "Rundung6" radius 2 2 edges at (-25, -25, 2.5) (-25, 125, 2.5)
sketch "Skizze37" plane through (0, 0, 0) normal (0, 0, -1) x (-1, 0, 0)
  arc A0 (23.1, -20.49) -> (20.5755, -23.0145) centre (21.2, -21.1145) ccw projected
  arc A1 (20.7515, 22.8345) -> (23.1, 20.261) centre (21.2, 20.8855) ccw projected
  arc A2 (23.1, 29.51) -> (20.5755, 26.9855) centre (21.2, 28.8855) ccw projected
  arc A3 (20.7515, 72.8345) -> (23.1, 70.261) centre (21.2, 70.8855) ccw projected
  arc A4 (23.1, 79.51) -> (20.5755, 76.9855) centre (21.2, 78.8855) ccw projected
  arc A5 (20.7515, 122.8345) -> (23.1, 120.261) centre (21.2, 120.8855) ccw projected
  point P0 (0, 0)
hole "Bohrung8" at (-21.2, 120.8855, 0) at (-21.2, 78.8855, 0) at (-21.2, 70.8855, 0) at (-21.2, 28.8855, 0) at (-21.2, 20.8855, 0) at (-21.2, -21.1145, 0) direction (0, 0, 1) diameter 3.2 end through all
equation "\"d_i\" = 40"
equation "\"d_o\" = 40"
equation "\"d_part\" = 50"
equation "\"d6\" = 0"
equation "\"d7\" = 0"
equation "\"d8\" = 0"
equation "\"d9\" = 0"
equation "\"d13\" = 0"
equation "\"d14\" = 0"
equation "\"d20\" = 0"
equation "\"d21\" = 0"
equation "\"d22\" = 0"
equation "\"d23\" = 0"
equation "\"d24\" = 0"
equation "\"d25\" = 3"
equation "\"d26\" = 0"
equation "\"d27\" = 0"
equation "\"d28\" = 0"
equation "\"d29\" = 0"
equation "\"d30\" = 0"
equation "\"d31\" = 0"
equation "\"d32\" = 0"
equation "\"d33\" = 0"
equation "\"d34\" = 0"
equation "\"d46\" = 0"
equation "\"d47\" = 0"
equation "\"d48\" = 0"
equation "\"d50\" = 0"
equation "\"d51\" = 0"
equation "\"d52\" = 0"
equation "\"d53\" = 0"
equation "\"d54\" = 0"
equation "\"d55\" = 0"
equation "\"d56\" = 0"
equation "\"d57\" = 0"
equation "\"d58\" = 0"
equation "\"d59\" = 0"
equation "\"magnet_offset\" = 0"
equation "\"screw_offset\" = 0"
equation "\"mal_puzzle_offset\" = 0"
equation "\"fem_puzzle_offset\" = 0"
properties part number "40_Cube_XY_Table_Aliexpress_naked_puzzlebar"
